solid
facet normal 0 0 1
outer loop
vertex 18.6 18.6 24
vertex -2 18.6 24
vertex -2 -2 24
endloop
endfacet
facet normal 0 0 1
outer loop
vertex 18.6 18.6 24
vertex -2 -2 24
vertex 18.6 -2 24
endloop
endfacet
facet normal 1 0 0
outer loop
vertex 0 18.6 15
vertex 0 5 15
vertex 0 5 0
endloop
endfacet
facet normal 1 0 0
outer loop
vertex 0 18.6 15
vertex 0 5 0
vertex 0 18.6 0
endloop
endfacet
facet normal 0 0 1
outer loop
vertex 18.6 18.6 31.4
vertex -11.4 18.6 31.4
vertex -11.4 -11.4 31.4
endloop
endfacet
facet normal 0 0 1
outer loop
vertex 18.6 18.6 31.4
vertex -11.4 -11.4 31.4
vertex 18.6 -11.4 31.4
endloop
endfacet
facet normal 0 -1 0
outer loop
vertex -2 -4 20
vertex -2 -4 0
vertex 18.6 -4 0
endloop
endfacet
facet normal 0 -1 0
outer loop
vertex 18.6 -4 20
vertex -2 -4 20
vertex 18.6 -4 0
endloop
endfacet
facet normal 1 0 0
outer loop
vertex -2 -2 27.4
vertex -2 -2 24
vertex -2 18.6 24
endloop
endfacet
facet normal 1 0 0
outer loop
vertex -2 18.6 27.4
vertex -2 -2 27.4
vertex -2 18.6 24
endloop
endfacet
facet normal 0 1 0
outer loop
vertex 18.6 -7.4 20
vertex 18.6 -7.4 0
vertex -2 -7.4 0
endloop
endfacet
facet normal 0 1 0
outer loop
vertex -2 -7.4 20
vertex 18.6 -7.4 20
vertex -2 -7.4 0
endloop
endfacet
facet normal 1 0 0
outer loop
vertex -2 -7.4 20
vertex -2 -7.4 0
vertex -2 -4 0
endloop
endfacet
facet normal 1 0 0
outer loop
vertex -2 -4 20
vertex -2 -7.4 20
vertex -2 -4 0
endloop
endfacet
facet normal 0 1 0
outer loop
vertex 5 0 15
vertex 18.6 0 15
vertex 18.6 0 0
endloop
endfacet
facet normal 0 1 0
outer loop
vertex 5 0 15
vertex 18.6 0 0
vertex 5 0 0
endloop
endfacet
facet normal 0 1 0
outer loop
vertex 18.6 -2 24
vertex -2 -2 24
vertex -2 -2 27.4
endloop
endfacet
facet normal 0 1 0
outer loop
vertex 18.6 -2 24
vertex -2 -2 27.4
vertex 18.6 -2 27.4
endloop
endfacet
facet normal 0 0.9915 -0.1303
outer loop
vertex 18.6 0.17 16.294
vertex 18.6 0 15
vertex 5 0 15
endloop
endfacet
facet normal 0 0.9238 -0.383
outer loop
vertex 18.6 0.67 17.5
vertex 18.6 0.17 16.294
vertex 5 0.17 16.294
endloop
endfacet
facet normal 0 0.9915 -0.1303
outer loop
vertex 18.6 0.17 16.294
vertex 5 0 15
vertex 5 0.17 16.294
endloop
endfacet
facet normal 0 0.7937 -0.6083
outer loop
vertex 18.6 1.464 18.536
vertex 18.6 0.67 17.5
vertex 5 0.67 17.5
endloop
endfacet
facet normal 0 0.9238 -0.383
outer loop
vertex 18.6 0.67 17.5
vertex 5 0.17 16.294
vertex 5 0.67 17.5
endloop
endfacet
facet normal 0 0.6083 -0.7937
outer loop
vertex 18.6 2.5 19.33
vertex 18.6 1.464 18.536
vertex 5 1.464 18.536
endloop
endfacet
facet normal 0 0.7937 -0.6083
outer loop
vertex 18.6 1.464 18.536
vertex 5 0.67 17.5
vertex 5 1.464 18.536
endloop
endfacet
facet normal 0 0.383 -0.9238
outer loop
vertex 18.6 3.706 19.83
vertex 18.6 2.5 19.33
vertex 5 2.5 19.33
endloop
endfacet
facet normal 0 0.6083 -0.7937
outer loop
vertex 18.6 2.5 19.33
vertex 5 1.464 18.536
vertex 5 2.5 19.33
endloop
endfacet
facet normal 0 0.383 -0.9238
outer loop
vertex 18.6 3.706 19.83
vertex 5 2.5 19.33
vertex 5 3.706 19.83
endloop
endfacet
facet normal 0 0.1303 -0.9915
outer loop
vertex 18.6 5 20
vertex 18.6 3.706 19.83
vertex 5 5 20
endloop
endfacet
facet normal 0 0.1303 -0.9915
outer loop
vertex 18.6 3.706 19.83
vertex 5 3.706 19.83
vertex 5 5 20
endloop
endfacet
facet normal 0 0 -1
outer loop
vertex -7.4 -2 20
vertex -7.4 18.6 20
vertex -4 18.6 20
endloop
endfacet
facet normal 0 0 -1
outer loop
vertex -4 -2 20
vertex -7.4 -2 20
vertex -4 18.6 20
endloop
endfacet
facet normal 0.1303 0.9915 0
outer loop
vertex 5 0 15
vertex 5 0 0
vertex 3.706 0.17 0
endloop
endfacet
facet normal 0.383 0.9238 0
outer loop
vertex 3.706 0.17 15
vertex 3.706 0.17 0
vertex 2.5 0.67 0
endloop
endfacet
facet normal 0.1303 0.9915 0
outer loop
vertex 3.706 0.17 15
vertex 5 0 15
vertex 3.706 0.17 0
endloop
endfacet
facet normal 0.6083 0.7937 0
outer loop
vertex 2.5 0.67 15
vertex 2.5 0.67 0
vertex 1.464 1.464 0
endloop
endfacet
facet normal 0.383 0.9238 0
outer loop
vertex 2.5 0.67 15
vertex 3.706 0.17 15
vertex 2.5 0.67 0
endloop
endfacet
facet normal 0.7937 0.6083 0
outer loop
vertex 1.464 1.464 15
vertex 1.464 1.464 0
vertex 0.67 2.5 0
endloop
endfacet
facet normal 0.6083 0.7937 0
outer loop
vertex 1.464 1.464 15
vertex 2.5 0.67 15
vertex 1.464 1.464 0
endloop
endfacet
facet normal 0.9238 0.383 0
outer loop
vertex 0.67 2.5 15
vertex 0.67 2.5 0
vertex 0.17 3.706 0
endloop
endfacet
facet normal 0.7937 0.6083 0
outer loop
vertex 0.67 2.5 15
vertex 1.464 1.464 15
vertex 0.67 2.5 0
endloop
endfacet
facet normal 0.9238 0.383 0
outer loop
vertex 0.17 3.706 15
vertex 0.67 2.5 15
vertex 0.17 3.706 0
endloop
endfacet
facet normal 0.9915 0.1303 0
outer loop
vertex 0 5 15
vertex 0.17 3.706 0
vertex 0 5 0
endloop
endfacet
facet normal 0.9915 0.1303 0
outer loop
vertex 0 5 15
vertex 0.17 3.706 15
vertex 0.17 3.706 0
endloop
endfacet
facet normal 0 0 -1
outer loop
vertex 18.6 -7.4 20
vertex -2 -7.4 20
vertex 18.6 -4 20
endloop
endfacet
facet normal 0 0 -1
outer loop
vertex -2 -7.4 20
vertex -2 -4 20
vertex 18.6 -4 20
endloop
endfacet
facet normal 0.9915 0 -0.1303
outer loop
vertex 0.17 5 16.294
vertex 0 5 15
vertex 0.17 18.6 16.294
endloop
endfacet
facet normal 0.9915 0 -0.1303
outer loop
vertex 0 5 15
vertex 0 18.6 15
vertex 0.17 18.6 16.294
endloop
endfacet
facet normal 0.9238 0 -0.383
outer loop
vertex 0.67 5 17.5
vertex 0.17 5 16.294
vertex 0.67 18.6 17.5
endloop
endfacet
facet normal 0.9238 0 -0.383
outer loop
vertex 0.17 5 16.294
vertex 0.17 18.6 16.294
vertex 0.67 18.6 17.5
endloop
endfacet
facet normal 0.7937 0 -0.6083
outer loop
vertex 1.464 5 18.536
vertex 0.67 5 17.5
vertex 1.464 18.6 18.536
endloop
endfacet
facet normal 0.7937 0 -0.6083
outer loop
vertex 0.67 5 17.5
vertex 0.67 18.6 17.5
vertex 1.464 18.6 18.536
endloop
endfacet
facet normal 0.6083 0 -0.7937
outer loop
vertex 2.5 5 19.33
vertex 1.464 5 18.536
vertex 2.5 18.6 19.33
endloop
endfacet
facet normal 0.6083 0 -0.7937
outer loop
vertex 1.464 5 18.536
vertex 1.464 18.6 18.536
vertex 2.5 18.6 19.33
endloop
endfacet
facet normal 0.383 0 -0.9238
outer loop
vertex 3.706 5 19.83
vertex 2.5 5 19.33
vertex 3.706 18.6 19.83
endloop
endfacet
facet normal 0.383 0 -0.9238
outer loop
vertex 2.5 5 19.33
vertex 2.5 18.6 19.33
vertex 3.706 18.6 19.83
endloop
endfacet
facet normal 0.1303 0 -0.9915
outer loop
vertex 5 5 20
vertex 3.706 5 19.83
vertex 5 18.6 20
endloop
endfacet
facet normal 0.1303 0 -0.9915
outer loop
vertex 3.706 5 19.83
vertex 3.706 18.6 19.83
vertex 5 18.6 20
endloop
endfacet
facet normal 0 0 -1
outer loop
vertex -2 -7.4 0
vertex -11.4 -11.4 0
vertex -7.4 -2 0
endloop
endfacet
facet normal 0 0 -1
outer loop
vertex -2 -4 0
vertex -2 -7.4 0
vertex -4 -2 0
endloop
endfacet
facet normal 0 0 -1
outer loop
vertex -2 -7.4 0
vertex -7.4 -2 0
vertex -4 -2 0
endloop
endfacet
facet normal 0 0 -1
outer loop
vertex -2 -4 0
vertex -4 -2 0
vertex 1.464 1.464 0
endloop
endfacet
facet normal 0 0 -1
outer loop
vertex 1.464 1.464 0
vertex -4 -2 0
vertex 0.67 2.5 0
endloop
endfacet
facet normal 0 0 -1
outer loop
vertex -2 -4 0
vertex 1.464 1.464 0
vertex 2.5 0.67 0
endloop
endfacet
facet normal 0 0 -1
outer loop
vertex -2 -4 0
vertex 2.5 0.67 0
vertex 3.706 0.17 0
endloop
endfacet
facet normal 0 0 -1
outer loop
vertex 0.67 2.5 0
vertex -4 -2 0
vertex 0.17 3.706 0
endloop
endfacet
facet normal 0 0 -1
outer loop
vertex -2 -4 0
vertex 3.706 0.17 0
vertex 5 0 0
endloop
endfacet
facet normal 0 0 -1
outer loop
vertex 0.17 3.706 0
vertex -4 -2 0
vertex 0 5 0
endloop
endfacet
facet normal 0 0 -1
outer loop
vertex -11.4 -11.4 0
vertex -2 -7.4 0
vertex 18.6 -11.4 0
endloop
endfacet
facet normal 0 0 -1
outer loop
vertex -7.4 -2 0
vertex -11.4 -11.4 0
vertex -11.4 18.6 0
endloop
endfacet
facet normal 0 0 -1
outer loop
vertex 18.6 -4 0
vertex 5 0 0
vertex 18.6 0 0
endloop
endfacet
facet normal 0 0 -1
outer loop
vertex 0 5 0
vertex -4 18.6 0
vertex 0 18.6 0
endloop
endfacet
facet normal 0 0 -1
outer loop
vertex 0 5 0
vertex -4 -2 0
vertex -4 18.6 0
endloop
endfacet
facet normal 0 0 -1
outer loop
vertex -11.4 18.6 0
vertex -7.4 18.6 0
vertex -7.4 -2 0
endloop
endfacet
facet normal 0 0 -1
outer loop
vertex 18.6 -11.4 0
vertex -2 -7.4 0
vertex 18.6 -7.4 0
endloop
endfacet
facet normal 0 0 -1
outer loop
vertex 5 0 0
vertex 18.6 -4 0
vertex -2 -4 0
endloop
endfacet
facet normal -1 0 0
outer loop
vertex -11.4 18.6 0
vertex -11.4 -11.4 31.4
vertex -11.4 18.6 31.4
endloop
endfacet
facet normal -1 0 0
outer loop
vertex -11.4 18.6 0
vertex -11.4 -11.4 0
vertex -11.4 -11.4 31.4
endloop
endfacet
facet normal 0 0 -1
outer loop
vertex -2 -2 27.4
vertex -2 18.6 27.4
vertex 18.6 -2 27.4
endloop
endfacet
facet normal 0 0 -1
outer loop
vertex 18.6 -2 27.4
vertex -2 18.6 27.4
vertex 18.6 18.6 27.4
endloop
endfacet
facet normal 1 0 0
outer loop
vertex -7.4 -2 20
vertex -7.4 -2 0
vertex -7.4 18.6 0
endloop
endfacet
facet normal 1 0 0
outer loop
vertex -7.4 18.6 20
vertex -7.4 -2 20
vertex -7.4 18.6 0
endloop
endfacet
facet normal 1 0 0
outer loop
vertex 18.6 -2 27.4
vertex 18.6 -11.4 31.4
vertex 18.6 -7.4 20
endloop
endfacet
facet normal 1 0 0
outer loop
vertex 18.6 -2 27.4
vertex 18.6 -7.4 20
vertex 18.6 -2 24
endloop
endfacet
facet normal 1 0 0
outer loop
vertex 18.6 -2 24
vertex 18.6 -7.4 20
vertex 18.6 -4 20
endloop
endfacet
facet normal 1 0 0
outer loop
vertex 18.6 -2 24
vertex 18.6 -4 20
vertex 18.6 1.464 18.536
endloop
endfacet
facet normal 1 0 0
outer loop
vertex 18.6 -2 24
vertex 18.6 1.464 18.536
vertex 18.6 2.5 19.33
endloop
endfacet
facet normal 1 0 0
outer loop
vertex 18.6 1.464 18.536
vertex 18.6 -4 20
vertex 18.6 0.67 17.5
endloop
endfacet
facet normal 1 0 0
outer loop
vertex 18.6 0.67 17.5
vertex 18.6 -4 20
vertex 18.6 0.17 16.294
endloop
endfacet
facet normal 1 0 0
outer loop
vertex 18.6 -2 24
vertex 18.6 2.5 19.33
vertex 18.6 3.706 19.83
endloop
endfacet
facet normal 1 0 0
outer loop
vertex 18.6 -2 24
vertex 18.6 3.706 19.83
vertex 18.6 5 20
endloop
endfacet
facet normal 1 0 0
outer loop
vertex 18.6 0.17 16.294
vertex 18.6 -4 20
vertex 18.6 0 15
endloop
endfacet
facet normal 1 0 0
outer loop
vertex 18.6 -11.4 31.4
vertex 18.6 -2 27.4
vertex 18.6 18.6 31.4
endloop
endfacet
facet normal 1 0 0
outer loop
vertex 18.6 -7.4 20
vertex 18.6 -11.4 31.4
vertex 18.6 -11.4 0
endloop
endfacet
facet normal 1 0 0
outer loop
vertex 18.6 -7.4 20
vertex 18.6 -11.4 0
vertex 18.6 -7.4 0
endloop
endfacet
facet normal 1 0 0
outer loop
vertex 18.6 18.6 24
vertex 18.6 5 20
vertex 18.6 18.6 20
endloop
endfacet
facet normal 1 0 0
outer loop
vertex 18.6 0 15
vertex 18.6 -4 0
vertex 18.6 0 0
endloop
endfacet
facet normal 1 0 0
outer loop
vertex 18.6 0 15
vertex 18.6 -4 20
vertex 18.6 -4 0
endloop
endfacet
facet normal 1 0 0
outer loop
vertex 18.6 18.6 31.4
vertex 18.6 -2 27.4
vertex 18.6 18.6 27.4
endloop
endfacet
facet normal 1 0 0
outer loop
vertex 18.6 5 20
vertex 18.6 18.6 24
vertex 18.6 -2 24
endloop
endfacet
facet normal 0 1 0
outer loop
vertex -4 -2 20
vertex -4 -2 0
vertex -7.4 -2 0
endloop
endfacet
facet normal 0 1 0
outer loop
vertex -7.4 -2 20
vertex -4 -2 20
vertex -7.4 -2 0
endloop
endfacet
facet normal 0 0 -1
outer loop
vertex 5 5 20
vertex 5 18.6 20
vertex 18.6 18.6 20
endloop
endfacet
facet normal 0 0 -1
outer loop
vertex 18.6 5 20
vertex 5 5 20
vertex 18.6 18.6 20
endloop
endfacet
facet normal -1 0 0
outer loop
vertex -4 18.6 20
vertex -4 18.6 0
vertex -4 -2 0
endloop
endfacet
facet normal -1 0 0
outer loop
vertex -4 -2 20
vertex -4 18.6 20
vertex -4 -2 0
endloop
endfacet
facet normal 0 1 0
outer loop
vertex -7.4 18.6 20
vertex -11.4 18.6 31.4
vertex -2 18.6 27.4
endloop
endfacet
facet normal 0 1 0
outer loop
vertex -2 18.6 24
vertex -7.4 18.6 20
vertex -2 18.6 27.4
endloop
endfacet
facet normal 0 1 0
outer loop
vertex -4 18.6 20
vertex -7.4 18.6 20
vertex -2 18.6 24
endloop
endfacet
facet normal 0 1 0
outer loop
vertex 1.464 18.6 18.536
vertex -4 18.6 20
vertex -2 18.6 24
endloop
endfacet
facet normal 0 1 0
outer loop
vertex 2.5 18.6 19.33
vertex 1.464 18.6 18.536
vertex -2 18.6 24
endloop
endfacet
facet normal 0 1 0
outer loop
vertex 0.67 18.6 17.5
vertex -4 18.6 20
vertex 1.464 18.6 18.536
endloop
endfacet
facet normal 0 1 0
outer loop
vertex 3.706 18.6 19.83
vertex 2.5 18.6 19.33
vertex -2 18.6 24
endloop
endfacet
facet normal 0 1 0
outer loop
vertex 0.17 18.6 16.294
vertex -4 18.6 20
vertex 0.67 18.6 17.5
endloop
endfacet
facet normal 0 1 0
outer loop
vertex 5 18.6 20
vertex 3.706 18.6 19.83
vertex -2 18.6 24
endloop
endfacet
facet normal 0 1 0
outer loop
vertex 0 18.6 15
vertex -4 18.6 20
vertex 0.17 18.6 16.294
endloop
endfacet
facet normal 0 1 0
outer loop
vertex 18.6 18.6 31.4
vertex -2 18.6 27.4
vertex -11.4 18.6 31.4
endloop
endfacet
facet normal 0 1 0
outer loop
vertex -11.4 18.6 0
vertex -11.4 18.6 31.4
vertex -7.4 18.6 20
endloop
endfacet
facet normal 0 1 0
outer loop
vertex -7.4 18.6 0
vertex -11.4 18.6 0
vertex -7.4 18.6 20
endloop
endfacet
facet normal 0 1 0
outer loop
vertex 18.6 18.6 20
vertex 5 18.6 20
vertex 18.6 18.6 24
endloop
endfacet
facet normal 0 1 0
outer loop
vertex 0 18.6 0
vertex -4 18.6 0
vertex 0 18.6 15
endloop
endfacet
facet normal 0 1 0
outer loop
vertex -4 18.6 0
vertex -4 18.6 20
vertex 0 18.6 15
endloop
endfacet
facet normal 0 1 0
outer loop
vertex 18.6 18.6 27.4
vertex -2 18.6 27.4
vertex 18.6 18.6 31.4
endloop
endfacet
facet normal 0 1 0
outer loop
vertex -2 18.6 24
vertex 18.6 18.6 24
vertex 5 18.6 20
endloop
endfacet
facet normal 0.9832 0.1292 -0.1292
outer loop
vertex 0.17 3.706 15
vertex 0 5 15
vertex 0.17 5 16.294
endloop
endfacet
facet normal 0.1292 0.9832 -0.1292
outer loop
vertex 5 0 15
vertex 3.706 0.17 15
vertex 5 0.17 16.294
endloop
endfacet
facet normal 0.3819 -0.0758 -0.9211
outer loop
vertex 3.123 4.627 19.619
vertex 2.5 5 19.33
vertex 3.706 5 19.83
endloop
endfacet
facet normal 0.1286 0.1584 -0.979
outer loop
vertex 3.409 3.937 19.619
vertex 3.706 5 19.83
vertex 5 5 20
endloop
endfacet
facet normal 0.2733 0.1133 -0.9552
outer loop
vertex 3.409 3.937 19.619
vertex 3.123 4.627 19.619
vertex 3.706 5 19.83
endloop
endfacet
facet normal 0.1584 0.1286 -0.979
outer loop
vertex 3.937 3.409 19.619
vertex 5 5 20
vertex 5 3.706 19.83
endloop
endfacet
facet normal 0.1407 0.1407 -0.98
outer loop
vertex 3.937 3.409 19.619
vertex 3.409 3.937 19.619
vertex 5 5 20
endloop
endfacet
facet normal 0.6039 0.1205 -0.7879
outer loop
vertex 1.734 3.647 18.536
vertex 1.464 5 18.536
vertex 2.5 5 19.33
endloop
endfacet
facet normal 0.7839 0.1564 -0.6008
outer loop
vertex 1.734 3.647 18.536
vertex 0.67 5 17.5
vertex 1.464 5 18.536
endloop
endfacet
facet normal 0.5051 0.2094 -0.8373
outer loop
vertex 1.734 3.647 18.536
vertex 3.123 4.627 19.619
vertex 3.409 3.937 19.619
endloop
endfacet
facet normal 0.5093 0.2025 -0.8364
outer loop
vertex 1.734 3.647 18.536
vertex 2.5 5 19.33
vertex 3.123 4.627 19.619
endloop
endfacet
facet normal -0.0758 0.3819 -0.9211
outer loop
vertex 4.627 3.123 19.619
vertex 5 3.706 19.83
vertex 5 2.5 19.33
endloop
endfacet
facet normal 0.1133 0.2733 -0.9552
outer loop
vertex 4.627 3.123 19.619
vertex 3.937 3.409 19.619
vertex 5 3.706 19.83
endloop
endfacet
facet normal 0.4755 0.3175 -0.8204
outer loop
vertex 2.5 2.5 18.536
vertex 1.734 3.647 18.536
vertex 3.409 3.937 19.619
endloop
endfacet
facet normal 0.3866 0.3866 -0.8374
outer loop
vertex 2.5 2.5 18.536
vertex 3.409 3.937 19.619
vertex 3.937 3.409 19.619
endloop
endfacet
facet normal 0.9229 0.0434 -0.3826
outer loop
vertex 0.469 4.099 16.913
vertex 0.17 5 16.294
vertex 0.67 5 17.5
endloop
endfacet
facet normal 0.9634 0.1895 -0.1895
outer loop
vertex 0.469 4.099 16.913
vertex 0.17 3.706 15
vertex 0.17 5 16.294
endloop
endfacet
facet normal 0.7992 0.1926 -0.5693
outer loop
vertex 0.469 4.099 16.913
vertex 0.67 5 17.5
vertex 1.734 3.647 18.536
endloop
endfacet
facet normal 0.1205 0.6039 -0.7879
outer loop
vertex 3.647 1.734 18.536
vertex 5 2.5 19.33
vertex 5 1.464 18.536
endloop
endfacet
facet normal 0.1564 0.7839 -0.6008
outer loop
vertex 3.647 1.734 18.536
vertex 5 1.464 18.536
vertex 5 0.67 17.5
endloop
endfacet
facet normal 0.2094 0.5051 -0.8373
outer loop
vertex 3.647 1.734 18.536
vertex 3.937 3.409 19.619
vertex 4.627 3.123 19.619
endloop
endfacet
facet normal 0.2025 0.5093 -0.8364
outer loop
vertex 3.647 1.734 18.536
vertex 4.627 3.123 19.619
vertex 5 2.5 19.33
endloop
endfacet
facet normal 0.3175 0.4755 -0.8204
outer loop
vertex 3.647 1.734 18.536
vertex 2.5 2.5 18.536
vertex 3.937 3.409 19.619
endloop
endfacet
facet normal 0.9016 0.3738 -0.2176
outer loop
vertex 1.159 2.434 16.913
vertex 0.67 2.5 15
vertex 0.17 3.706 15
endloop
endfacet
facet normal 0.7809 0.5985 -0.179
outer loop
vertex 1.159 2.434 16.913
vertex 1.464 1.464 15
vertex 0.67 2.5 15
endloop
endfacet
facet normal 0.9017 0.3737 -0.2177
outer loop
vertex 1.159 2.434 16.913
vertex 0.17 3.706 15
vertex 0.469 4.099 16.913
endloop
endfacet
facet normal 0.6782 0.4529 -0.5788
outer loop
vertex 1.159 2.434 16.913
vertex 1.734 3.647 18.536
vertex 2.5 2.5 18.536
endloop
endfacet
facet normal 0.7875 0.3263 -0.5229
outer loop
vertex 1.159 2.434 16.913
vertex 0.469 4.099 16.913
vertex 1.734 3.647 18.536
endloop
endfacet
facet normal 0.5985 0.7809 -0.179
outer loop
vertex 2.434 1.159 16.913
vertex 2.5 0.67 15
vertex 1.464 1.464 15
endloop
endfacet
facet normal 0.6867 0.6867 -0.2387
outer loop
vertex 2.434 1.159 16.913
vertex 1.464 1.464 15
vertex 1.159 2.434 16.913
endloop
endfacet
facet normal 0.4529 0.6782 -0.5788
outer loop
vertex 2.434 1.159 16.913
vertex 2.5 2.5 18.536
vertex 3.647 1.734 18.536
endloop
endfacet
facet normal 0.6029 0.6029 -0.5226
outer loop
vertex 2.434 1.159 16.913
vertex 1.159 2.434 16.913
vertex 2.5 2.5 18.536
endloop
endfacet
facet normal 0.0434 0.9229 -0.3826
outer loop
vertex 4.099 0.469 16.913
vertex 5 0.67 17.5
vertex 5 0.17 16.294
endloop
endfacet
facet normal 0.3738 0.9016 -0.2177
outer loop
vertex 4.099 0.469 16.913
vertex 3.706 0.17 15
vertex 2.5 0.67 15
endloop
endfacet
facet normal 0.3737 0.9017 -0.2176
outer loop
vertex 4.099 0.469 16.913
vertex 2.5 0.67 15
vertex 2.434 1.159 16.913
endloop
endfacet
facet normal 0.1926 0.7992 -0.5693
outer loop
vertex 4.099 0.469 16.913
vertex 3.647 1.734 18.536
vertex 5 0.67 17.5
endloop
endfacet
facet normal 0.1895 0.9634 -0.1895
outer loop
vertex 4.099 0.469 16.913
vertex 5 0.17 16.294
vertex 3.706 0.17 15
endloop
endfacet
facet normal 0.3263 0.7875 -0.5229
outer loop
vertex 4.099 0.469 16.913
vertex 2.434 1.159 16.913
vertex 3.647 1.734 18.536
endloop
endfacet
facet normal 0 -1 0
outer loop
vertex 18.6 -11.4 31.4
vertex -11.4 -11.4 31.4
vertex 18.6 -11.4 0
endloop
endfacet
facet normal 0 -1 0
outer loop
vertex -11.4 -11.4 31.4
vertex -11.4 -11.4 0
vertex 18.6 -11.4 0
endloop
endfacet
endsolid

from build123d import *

# Parameters (mm, degrees)
F4_DEPTH  = 20
F5_W      = 3.4
F5_H      = 20.6
F5_W_2    = 20.6
F5_H_2    = 3.4
F5_W_3    = 18.6
F5_H_3    = 18.6
F6_DEPTH  = 2
F7_DEPTH  = 2
F8_W      = 20.6
F8_H      = 9.4
F9_DEPTH  = 3.4
F10_W     = 30
F10_H     = 30
F11_DEPTH = 4
F12_R     = 5


with BuildPart() as f4:
    # F3 (on Top) → F4 (new body)
    with BuildSketch(Plane.XY):
        Polygon((0, 18.6), (-4, 18.6), (-4, -2), (-7.4, -2), (-7.4, 18.6), (-11.4, 18.6), (-11.4, -11.4), (18.6, -11.4), (18.6, -7.4), (-2, -7.4), (-2, -4), (18.6, -4), (18.6, 0), (0, 0), align=None)
    extrude(amount=F4_DEPTH)

    # F5 (on face) → F6 (join)
    with BuildSketch(Plane.XY.offset(20)):
        with Locations((-5.7, 8.3)):
            Rectangle(F5_W, F5_H)
        Polygon((-11.4, 18.6), (-11.4, -11.4), (18.6, -11.4), (18.6, -7.4), (-2, -7.4), (-2, -4), (18.6, -4), (18.6, 0), (0, 0), (0, 18.6), (-4, 18.6), (-4, -2), (-7.4, -2), (-7.4, 18.6), align=None)
        with Locations((8.3, -5.7)):
            Rectangle(F5_W_2, F5_H_2)
        with Locations((9.3, 9.3)):
            Rectangle(F5_W_3, F5_H_3)
    extrude(amount=F6_DEPTH)

    # F7 (add): a face of the model
    f7_faces = [f4.faces().sort_by_distance(p)[0] for p in [
        (3.6, 3.6, 22),
    ]]
    extrude(f7_faces, amount=F7_DEPTH)

    # F8 (on face) → F9 (join)
    with BuildSketch(Plane.XY.offset(24)):
        Polygon((-2, 18.6), (-11.4, 18.6), (-11.4, -11.4), (-2, -11.4), (-2, -2), align=None)
        with Locations((8.3, -6.7)):
            Rectangle(F8_W, F8_H)
    extrude(amount=F9_DEPTH)

    # F10 (on face) → F11 (join)
    with BuildSketch(Plane.XY.offset(27.4)):
        with Locations((3.6, 3.6)):
            Rectangle(F10_W, F10_H)
    extrude(amount=F11_DEPTH)

    # F12
    f12_edges = [f4.edges().sort_by_distance(p)[0] for p in [
        (0, 0, 10),
        (0, 9.3, 20),
        (9.3, 0, 20),
    ]]
    fillet(f12_edges, radius=F12_R)


solid = f4.part
